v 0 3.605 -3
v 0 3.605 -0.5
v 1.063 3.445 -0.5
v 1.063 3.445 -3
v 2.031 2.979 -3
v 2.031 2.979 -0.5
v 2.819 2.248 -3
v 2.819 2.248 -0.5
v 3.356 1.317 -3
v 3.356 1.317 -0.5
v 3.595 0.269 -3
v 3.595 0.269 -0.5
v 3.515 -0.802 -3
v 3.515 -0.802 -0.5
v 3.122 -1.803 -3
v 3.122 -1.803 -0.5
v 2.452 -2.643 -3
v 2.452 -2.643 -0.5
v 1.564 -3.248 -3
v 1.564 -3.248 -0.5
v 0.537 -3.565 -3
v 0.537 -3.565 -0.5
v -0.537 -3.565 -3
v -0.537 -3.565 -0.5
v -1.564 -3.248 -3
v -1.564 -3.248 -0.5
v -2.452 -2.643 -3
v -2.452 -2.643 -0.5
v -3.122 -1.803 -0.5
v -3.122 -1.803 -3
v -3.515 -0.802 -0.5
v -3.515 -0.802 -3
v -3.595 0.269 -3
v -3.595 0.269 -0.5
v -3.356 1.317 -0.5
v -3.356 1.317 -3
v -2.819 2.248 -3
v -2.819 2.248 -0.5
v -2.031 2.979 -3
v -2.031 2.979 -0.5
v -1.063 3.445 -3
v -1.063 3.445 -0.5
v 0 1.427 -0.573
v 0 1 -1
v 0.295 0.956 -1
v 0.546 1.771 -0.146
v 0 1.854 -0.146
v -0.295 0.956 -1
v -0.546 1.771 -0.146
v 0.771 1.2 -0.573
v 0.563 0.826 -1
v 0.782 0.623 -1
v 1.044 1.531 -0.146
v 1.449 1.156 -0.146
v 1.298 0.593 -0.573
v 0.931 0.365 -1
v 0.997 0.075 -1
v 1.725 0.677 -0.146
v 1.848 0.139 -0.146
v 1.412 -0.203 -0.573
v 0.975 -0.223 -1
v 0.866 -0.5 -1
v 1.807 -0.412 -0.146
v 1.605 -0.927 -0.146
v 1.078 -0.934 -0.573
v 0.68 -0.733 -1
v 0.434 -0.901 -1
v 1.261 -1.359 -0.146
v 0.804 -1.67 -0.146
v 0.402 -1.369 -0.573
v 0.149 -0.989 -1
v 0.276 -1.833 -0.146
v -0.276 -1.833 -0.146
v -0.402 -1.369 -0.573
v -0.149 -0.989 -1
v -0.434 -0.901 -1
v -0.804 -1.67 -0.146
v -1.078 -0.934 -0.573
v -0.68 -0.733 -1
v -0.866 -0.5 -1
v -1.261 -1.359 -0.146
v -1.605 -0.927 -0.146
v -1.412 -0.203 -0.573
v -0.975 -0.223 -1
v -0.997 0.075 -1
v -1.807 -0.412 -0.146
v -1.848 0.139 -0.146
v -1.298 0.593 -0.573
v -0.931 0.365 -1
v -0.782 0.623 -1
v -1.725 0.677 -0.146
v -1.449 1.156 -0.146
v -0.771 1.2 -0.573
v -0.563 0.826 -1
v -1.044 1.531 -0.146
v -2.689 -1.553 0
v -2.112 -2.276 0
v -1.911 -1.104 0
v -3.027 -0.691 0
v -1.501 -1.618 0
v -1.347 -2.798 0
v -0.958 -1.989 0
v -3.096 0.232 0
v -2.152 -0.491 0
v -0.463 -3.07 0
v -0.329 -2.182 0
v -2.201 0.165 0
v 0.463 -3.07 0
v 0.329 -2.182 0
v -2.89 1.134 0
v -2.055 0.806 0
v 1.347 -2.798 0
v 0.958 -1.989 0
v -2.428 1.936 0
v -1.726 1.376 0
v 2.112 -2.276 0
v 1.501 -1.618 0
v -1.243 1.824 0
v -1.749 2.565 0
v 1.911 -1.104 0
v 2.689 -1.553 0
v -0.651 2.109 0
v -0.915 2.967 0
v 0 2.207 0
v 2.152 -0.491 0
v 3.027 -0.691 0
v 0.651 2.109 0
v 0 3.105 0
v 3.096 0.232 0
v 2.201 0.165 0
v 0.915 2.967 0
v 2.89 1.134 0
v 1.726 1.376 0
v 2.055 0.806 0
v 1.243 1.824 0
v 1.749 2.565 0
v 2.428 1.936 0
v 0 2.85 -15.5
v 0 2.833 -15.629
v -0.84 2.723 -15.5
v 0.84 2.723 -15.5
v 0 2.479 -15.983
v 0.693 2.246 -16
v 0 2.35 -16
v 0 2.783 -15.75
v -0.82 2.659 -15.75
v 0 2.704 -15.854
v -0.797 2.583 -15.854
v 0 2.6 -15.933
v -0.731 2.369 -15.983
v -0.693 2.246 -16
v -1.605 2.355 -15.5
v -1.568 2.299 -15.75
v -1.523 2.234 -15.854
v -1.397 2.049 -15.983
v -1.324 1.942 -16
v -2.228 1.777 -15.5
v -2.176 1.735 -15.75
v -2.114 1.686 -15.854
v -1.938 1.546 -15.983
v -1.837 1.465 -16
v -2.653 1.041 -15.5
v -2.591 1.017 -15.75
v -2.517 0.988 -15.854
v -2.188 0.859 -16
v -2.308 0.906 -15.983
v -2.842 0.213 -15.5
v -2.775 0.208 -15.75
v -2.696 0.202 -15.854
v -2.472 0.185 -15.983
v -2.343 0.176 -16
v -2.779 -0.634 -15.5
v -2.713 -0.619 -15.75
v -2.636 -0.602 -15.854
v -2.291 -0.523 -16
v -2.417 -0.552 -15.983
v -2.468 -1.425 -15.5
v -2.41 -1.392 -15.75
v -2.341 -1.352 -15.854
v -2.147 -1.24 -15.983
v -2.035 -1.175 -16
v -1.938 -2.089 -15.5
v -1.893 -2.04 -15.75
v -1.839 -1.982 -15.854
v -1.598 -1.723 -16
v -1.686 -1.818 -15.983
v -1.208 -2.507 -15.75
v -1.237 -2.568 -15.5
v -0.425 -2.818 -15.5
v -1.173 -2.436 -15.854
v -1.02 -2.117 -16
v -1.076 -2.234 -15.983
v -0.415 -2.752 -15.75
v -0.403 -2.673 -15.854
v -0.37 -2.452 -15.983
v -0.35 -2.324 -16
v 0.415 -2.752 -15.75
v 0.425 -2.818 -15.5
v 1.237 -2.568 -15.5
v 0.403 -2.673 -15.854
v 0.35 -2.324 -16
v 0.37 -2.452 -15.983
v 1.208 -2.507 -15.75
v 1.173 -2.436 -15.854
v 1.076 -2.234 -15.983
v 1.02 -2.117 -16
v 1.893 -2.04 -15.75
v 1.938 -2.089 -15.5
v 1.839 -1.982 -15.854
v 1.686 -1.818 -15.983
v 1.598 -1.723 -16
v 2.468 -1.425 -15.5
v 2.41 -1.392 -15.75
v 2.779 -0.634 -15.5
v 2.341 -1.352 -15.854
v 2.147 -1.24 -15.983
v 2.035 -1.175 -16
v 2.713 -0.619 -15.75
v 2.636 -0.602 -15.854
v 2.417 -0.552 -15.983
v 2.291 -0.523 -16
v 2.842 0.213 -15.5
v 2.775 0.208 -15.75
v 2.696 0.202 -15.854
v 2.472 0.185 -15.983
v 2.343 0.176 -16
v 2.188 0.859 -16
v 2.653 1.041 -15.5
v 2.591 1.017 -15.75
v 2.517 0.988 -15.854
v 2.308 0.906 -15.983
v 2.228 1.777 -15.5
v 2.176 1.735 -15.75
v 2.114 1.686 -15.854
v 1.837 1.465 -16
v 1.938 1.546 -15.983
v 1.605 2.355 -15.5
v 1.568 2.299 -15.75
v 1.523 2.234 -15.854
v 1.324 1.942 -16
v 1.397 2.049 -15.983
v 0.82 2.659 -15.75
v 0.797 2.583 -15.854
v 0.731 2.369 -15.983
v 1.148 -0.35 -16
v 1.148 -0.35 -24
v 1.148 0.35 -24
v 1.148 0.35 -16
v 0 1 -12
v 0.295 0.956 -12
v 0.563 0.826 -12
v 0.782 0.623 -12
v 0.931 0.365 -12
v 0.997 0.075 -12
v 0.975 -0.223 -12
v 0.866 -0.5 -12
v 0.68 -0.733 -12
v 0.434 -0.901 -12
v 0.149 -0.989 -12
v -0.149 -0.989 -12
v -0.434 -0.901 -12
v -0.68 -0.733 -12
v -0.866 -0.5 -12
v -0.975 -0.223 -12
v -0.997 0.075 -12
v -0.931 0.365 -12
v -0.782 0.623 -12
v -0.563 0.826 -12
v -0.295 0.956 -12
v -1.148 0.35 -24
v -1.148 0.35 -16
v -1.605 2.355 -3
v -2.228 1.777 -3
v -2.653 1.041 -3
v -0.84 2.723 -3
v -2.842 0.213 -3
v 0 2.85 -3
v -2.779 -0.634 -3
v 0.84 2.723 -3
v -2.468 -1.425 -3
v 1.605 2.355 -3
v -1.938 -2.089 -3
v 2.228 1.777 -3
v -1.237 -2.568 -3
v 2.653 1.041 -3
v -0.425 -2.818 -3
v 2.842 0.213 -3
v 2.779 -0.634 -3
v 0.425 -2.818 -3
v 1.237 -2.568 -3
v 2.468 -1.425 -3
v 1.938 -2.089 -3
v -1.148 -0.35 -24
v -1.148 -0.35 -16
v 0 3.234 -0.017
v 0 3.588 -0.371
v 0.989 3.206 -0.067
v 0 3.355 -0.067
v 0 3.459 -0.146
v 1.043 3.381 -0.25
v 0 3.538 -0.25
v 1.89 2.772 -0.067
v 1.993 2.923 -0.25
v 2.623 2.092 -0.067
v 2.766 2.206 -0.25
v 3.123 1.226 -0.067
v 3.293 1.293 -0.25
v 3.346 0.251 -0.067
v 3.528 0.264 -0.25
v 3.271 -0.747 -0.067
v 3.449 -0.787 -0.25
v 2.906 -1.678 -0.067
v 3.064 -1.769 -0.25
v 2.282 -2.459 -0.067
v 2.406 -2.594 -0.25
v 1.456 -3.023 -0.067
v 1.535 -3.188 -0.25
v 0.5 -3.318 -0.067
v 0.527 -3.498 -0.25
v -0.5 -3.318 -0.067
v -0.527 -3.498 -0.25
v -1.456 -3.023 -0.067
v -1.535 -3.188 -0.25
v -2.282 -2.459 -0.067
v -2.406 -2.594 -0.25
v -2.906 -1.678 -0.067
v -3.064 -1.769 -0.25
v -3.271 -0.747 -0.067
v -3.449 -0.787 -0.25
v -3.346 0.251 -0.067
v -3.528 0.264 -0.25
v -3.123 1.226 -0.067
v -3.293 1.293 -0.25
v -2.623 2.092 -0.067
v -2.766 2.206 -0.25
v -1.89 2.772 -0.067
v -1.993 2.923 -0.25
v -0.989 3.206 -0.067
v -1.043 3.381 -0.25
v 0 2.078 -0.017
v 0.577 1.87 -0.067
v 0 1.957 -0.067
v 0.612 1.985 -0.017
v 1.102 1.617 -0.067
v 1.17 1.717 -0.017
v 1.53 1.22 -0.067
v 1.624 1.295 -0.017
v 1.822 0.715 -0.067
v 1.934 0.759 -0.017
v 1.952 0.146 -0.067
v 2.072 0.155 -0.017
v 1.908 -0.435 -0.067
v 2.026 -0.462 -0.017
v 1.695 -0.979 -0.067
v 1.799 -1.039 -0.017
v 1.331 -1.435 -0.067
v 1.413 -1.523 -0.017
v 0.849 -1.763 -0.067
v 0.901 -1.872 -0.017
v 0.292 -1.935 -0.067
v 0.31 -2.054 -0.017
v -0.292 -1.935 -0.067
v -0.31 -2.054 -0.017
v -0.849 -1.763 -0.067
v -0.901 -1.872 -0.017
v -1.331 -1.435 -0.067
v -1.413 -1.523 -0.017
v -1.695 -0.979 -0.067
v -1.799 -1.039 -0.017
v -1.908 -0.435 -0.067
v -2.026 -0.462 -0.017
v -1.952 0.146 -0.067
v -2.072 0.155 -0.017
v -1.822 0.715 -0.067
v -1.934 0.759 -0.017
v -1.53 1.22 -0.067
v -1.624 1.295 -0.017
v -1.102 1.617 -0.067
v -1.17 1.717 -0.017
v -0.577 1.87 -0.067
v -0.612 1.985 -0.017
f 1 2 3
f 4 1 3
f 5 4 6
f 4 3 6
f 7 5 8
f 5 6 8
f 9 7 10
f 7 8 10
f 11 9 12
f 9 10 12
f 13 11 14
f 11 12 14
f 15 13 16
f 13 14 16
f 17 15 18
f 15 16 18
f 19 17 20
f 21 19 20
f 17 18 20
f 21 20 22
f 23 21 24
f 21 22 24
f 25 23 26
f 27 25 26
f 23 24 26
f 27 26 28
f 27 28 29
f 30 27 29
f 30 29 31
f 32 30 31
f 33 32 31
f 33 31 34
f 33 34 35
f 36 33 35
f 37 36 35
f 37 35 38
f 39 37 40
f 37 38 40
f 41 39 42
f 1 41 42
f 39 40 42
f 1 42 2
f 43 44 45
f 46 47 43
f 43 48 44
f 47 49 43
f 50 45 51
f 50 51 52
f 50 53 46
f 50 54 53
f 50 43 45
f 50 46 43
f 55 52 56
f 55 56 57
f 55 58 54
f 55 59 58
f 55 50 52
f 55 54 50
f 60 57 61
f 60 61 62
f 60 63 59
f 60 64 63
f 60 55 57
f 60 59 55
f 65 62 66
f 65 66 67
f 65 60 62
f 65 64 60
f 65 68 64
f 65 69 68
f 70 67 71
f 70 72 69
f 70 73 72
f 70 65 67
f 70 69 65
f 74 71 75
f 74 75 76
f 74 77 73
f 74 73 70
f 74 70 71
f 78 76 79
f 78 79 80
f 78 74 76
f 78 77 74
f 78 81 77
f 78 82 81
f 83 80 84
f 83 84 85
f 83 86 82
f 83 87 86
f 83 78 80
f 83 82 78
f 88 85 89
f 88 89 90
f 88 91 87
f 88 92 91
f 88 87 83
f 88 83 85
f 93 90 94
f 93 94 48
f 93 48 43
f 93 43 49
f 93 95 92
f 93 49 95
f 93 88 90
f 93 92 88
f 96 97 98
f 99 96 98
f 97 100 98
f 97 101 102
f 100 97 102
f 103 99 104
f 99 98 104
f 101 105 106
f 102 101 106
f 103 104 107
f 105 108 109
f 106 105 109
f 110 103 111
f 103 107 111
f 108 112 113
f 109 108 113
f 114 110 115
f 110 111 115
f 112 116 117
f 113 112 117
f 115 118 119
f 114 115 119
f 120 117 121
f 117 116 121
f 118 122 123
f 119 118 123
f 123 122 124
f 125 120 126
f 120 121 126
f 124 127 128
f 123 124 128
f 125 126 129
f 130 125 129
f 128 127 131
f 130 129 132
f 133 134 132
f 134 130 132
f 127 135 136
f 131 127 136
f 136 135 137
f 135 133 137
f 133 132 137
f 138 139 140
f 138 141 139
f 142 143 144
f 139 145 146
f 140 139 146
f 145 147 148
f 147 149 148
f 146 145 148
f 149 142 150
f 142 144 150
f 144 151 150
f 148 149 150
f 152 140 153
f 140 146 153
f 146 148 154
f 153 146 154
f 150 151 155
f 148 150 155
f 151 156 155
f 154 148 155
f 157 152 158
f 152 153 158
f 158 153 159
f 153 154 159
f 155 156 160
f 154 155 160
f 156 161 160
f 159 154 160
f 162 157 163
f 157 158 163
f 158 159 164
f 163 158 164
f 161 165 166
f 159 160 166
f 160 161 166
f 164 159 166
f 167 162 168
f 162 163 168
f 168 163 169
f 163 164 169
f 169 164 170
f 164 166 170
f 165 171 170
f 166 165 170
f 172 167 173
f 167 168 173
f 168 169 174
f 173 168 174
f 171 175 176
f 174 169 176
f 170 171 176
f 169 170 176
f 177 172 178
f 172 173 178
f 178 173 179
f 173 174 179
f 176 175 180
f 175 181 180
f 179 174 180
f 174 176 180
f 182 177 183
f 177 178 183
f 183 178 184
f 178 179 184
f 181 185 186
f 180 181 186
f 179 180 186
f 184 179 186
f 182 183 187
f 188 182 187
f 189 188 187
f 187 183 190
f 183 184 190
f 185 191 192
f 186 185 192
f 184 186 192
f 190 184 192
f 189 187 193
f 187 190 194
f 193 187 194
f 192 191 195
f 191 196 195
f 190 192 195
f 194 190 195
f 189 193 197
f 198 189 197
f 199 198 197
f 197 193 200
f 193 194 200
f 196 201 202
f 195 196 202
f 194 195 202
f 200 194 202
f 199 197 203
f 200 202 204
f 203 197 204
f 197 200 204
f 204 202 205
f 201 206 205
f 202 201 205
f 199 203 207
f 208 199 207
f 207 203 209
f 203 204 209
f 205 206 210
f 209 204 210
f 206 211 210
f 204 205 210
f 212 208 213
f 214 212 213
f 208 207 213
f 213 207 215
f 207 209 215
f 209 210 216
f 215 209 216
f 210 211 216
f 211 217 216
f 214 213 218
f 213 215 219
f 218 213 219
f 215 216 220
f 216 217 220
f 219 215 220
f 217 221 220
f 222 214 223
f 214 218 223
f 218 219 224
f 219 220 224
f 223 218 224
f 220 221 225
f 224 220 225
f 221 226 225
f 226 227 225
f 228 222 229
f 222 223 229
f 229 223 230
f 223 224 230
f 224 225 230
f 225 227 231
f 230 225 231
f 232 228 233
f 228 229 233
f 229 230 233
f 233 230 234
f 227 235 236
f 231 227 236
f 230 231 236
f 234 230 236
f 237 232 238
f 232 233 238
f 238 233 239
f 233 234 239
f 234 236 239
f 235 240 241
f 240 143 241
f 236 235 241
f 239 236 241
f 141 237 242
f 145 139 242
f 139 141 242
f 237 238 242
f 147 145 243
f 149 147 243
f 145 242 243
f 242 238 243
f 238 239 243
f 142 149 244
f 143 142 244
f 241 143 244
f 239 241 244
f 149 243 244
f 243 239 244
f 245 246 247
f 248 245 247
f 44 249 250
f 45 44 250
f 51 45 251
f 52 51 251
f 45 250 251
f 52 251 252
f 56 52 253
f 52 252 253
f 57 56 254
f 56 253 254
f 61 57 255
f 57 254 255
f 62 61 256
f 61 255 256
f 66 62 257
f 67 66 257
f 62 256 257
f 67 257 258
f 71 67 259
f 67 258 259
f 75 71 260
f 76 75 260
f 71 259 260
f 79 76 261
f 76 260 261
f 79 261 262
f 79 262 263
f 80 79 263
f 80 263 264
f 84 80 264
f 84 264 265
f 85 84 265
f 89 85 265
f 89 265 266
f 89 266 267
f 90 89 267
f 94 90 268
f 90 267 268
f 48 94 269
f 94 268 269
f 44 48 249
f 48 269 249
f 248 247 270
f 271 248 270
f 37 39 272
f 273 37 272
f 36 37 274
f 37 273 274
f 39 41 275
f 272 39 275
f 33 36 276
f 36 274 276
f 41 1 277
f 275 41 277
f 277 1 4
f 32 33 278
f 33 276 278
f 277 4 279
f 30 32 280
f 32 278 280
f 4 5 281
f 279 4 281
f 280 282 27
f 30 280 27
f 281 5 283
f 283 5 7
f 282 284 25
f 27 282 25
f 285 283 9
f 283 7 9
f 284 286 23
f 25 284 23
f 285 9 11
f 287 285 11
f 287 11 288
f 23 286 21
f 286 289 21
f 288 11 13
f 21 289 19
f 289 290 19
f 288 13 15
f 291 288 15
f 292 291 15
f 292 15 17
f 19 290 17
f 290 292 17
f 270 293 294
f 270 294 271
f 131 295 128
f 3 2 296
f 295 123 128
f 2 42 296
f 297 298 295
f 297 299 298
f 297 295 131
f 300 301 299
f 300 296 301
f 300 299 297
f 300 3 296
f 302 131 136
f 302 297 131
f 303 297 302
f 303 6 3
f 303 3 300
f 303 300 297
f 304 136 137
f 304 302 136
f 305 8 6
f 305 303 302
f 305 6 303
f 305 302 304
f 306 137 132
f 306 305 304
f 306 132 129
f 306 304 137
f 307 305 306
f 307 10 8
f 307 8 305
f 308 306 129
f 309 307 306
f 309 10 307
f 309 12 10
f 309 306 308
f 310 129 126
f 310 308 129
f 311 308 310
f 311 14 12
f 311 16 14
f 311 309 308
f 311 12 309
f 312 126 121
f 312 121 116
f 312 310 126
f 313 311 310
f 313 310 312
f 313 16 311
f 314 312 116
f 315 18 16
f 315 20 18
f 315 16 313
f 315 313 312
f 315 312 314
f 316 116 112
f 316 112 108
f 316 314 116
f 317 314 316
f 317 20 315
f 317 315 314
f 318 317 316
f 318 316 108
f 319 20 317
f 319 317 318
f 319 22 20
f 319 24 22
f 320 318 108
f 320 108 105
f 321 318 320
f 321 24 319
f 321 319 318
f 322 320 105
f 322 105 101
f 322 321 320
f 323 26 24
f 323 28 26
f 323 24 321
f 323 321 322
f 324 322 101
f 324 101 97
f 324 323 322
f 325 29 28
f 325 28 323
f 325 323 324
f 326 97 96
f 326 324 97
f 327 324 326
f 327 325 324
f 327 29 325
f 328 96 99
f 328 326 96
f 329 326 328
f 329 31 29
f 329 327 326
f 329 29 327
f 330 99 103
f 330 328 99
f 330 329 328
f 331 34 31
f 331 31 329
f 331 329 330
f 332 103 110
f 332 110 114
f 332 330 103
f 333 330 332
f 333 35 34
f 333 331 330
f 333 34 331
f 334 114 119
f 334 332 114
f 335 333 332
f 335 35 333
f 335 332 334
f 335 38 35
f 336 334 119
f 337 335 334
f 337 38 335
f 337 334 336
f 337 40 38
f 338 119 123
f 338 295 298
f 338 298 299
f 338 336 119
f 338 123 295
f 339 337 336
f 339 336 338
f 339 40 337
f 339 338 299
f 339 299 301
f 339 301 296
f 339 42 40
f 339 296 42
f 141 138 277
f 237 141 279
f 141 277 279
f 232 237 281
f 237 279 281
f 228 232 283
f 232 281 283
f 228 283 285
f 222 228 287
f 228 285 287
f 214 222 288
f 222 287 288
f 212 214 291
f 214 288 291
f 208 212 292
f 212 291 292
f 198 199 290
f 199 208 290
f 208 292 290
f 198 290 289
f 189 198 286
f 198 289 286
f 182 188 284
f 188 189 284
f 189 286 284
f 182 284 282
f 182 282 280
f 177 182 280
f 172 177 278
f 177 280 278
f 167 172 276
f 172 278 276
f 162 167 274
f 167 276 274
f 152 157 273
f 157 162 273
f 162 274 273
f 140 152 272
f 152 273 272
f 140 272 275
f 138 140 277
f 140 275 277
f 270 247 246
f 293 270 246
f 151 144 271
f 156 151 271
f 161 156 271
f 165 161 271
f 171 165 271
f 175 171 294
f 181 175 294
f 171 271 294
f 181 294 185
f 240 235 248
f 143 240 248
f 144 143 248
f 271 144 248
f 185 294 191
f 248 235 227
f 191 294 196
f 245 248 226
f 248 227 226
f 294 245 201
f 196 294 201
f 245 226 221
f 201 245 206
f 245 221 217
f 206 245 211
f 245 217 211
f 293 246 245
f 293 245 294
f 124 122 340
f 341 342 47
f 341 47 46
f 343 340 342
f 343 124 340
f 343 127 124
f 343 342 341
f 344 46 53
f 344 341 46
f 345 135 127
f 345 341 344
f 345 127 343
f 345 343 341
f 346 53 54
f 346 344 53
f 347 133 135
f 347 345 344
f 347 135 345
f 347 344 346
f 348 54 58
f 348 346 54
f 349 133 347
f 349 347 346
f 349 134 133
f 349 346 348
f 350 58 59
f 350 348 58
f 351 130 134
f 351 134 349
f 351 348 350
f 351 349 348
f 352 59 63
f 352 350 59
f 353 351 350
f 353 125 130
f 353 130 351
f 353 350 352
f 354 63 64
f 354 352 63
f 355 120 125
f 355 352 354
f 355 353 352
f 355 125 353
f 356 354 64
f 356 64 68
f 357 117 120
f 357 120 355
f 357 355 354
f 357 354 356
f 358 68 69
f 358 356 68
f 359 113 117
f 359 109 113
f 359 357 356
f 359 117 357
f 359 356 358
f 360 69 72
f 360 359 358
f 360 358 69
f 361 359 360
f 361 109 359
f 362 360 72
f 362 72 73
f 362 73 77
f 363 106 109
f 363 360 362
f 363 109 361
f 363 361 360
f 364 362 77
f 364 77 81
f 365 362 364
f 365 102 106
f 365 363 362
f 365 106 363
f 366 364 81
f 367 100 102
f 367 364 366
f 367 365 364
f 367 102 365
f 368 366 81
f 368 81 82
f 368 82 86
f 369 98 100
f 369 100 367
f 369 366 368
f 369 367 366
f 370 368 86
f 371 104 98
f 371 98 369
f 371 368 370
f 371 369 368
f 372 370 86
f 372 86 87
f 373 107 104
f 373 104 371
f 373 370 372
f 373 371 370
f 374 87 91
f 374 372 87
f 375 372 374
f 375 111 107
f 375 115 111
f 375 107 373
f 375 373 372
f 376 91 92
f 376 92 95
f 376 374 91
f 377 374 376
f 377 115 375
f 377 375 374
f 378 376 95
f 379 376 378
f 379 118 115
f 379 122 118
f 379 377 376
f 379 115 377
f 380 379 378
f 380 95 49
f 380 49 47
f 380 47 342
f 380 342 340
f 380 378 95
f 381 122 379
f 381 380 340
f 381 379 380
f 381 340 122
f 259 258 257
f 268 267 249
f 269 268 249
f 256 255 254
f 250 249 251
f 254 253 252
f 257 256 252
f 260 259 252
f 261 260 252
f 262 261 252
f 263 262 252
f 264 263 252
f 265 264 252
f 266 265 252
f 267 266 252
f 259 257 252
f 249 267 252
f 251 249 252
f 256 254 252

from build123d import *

# Parameters (mm, degrees)
SKETCH3_W          = 4.030508652
SKETCH3_H          = 4.030508652
SKETCH3_W_2        = 2.295648056
SKETCH3_H_2        = 0.7
CUT_EXTRUDE1_DEPTH = 8
CHAMFER1_SIZE      = 1
FILLET1_R          = 0.5


with BuildPart() as part:
    # Sketch2 → Revolve1 (revolve)
    with BuildSketch(Plane(origin=(0, 0, 0), x_dir=(0, 0, -1), z_dir=(1, 0, 0))):
        Polygon((0, 1), (12, 1), (12, 0), (24, 0), (24, 1.2), (16, 1.2), (16, 2.85), (3, 2.85), (3, 3.605), (0, 3.605), align=None)
    revolve(axis=Axis((0, 0, 0), (0, 0, -1)))

    # Sketch3 → Cut-Extrude1 (cut)
    with BuildSketch(Plane(origin=(0, 0, -24), x_dir=(-1, 0, 0), z_dir=(0, 0, -1))):
        Rectangle(SKETCH3_W, SKETCH3_H)
        Rectangle(SKETCH3_W_2, SKETCH3_H_2, mode=Mode.SUBTRACT)
    extrude(amount=-CUT_EXTRUDE1_DEPTH, mode=Mode.SUBTRACT)

    # Chamfer1
    chamfer1_edges = [part.edges().sort_by_distance(p)[0] for p in [
        (0, -1, 0),
    ]]
    chamfer(chamfer1_edges, length=CHAMFER1_SIZE)

    # Fillet1
    fillet1_edges = [part.edges().sort_by_distance(p)[0] for p in [
        (0, -2, 0),
        (0, -3.605, 0),
        (0, -2.85, -16),
    ]]
    fillet(fillet1_edges, radius=FILLET1_R)


solid = part.part
